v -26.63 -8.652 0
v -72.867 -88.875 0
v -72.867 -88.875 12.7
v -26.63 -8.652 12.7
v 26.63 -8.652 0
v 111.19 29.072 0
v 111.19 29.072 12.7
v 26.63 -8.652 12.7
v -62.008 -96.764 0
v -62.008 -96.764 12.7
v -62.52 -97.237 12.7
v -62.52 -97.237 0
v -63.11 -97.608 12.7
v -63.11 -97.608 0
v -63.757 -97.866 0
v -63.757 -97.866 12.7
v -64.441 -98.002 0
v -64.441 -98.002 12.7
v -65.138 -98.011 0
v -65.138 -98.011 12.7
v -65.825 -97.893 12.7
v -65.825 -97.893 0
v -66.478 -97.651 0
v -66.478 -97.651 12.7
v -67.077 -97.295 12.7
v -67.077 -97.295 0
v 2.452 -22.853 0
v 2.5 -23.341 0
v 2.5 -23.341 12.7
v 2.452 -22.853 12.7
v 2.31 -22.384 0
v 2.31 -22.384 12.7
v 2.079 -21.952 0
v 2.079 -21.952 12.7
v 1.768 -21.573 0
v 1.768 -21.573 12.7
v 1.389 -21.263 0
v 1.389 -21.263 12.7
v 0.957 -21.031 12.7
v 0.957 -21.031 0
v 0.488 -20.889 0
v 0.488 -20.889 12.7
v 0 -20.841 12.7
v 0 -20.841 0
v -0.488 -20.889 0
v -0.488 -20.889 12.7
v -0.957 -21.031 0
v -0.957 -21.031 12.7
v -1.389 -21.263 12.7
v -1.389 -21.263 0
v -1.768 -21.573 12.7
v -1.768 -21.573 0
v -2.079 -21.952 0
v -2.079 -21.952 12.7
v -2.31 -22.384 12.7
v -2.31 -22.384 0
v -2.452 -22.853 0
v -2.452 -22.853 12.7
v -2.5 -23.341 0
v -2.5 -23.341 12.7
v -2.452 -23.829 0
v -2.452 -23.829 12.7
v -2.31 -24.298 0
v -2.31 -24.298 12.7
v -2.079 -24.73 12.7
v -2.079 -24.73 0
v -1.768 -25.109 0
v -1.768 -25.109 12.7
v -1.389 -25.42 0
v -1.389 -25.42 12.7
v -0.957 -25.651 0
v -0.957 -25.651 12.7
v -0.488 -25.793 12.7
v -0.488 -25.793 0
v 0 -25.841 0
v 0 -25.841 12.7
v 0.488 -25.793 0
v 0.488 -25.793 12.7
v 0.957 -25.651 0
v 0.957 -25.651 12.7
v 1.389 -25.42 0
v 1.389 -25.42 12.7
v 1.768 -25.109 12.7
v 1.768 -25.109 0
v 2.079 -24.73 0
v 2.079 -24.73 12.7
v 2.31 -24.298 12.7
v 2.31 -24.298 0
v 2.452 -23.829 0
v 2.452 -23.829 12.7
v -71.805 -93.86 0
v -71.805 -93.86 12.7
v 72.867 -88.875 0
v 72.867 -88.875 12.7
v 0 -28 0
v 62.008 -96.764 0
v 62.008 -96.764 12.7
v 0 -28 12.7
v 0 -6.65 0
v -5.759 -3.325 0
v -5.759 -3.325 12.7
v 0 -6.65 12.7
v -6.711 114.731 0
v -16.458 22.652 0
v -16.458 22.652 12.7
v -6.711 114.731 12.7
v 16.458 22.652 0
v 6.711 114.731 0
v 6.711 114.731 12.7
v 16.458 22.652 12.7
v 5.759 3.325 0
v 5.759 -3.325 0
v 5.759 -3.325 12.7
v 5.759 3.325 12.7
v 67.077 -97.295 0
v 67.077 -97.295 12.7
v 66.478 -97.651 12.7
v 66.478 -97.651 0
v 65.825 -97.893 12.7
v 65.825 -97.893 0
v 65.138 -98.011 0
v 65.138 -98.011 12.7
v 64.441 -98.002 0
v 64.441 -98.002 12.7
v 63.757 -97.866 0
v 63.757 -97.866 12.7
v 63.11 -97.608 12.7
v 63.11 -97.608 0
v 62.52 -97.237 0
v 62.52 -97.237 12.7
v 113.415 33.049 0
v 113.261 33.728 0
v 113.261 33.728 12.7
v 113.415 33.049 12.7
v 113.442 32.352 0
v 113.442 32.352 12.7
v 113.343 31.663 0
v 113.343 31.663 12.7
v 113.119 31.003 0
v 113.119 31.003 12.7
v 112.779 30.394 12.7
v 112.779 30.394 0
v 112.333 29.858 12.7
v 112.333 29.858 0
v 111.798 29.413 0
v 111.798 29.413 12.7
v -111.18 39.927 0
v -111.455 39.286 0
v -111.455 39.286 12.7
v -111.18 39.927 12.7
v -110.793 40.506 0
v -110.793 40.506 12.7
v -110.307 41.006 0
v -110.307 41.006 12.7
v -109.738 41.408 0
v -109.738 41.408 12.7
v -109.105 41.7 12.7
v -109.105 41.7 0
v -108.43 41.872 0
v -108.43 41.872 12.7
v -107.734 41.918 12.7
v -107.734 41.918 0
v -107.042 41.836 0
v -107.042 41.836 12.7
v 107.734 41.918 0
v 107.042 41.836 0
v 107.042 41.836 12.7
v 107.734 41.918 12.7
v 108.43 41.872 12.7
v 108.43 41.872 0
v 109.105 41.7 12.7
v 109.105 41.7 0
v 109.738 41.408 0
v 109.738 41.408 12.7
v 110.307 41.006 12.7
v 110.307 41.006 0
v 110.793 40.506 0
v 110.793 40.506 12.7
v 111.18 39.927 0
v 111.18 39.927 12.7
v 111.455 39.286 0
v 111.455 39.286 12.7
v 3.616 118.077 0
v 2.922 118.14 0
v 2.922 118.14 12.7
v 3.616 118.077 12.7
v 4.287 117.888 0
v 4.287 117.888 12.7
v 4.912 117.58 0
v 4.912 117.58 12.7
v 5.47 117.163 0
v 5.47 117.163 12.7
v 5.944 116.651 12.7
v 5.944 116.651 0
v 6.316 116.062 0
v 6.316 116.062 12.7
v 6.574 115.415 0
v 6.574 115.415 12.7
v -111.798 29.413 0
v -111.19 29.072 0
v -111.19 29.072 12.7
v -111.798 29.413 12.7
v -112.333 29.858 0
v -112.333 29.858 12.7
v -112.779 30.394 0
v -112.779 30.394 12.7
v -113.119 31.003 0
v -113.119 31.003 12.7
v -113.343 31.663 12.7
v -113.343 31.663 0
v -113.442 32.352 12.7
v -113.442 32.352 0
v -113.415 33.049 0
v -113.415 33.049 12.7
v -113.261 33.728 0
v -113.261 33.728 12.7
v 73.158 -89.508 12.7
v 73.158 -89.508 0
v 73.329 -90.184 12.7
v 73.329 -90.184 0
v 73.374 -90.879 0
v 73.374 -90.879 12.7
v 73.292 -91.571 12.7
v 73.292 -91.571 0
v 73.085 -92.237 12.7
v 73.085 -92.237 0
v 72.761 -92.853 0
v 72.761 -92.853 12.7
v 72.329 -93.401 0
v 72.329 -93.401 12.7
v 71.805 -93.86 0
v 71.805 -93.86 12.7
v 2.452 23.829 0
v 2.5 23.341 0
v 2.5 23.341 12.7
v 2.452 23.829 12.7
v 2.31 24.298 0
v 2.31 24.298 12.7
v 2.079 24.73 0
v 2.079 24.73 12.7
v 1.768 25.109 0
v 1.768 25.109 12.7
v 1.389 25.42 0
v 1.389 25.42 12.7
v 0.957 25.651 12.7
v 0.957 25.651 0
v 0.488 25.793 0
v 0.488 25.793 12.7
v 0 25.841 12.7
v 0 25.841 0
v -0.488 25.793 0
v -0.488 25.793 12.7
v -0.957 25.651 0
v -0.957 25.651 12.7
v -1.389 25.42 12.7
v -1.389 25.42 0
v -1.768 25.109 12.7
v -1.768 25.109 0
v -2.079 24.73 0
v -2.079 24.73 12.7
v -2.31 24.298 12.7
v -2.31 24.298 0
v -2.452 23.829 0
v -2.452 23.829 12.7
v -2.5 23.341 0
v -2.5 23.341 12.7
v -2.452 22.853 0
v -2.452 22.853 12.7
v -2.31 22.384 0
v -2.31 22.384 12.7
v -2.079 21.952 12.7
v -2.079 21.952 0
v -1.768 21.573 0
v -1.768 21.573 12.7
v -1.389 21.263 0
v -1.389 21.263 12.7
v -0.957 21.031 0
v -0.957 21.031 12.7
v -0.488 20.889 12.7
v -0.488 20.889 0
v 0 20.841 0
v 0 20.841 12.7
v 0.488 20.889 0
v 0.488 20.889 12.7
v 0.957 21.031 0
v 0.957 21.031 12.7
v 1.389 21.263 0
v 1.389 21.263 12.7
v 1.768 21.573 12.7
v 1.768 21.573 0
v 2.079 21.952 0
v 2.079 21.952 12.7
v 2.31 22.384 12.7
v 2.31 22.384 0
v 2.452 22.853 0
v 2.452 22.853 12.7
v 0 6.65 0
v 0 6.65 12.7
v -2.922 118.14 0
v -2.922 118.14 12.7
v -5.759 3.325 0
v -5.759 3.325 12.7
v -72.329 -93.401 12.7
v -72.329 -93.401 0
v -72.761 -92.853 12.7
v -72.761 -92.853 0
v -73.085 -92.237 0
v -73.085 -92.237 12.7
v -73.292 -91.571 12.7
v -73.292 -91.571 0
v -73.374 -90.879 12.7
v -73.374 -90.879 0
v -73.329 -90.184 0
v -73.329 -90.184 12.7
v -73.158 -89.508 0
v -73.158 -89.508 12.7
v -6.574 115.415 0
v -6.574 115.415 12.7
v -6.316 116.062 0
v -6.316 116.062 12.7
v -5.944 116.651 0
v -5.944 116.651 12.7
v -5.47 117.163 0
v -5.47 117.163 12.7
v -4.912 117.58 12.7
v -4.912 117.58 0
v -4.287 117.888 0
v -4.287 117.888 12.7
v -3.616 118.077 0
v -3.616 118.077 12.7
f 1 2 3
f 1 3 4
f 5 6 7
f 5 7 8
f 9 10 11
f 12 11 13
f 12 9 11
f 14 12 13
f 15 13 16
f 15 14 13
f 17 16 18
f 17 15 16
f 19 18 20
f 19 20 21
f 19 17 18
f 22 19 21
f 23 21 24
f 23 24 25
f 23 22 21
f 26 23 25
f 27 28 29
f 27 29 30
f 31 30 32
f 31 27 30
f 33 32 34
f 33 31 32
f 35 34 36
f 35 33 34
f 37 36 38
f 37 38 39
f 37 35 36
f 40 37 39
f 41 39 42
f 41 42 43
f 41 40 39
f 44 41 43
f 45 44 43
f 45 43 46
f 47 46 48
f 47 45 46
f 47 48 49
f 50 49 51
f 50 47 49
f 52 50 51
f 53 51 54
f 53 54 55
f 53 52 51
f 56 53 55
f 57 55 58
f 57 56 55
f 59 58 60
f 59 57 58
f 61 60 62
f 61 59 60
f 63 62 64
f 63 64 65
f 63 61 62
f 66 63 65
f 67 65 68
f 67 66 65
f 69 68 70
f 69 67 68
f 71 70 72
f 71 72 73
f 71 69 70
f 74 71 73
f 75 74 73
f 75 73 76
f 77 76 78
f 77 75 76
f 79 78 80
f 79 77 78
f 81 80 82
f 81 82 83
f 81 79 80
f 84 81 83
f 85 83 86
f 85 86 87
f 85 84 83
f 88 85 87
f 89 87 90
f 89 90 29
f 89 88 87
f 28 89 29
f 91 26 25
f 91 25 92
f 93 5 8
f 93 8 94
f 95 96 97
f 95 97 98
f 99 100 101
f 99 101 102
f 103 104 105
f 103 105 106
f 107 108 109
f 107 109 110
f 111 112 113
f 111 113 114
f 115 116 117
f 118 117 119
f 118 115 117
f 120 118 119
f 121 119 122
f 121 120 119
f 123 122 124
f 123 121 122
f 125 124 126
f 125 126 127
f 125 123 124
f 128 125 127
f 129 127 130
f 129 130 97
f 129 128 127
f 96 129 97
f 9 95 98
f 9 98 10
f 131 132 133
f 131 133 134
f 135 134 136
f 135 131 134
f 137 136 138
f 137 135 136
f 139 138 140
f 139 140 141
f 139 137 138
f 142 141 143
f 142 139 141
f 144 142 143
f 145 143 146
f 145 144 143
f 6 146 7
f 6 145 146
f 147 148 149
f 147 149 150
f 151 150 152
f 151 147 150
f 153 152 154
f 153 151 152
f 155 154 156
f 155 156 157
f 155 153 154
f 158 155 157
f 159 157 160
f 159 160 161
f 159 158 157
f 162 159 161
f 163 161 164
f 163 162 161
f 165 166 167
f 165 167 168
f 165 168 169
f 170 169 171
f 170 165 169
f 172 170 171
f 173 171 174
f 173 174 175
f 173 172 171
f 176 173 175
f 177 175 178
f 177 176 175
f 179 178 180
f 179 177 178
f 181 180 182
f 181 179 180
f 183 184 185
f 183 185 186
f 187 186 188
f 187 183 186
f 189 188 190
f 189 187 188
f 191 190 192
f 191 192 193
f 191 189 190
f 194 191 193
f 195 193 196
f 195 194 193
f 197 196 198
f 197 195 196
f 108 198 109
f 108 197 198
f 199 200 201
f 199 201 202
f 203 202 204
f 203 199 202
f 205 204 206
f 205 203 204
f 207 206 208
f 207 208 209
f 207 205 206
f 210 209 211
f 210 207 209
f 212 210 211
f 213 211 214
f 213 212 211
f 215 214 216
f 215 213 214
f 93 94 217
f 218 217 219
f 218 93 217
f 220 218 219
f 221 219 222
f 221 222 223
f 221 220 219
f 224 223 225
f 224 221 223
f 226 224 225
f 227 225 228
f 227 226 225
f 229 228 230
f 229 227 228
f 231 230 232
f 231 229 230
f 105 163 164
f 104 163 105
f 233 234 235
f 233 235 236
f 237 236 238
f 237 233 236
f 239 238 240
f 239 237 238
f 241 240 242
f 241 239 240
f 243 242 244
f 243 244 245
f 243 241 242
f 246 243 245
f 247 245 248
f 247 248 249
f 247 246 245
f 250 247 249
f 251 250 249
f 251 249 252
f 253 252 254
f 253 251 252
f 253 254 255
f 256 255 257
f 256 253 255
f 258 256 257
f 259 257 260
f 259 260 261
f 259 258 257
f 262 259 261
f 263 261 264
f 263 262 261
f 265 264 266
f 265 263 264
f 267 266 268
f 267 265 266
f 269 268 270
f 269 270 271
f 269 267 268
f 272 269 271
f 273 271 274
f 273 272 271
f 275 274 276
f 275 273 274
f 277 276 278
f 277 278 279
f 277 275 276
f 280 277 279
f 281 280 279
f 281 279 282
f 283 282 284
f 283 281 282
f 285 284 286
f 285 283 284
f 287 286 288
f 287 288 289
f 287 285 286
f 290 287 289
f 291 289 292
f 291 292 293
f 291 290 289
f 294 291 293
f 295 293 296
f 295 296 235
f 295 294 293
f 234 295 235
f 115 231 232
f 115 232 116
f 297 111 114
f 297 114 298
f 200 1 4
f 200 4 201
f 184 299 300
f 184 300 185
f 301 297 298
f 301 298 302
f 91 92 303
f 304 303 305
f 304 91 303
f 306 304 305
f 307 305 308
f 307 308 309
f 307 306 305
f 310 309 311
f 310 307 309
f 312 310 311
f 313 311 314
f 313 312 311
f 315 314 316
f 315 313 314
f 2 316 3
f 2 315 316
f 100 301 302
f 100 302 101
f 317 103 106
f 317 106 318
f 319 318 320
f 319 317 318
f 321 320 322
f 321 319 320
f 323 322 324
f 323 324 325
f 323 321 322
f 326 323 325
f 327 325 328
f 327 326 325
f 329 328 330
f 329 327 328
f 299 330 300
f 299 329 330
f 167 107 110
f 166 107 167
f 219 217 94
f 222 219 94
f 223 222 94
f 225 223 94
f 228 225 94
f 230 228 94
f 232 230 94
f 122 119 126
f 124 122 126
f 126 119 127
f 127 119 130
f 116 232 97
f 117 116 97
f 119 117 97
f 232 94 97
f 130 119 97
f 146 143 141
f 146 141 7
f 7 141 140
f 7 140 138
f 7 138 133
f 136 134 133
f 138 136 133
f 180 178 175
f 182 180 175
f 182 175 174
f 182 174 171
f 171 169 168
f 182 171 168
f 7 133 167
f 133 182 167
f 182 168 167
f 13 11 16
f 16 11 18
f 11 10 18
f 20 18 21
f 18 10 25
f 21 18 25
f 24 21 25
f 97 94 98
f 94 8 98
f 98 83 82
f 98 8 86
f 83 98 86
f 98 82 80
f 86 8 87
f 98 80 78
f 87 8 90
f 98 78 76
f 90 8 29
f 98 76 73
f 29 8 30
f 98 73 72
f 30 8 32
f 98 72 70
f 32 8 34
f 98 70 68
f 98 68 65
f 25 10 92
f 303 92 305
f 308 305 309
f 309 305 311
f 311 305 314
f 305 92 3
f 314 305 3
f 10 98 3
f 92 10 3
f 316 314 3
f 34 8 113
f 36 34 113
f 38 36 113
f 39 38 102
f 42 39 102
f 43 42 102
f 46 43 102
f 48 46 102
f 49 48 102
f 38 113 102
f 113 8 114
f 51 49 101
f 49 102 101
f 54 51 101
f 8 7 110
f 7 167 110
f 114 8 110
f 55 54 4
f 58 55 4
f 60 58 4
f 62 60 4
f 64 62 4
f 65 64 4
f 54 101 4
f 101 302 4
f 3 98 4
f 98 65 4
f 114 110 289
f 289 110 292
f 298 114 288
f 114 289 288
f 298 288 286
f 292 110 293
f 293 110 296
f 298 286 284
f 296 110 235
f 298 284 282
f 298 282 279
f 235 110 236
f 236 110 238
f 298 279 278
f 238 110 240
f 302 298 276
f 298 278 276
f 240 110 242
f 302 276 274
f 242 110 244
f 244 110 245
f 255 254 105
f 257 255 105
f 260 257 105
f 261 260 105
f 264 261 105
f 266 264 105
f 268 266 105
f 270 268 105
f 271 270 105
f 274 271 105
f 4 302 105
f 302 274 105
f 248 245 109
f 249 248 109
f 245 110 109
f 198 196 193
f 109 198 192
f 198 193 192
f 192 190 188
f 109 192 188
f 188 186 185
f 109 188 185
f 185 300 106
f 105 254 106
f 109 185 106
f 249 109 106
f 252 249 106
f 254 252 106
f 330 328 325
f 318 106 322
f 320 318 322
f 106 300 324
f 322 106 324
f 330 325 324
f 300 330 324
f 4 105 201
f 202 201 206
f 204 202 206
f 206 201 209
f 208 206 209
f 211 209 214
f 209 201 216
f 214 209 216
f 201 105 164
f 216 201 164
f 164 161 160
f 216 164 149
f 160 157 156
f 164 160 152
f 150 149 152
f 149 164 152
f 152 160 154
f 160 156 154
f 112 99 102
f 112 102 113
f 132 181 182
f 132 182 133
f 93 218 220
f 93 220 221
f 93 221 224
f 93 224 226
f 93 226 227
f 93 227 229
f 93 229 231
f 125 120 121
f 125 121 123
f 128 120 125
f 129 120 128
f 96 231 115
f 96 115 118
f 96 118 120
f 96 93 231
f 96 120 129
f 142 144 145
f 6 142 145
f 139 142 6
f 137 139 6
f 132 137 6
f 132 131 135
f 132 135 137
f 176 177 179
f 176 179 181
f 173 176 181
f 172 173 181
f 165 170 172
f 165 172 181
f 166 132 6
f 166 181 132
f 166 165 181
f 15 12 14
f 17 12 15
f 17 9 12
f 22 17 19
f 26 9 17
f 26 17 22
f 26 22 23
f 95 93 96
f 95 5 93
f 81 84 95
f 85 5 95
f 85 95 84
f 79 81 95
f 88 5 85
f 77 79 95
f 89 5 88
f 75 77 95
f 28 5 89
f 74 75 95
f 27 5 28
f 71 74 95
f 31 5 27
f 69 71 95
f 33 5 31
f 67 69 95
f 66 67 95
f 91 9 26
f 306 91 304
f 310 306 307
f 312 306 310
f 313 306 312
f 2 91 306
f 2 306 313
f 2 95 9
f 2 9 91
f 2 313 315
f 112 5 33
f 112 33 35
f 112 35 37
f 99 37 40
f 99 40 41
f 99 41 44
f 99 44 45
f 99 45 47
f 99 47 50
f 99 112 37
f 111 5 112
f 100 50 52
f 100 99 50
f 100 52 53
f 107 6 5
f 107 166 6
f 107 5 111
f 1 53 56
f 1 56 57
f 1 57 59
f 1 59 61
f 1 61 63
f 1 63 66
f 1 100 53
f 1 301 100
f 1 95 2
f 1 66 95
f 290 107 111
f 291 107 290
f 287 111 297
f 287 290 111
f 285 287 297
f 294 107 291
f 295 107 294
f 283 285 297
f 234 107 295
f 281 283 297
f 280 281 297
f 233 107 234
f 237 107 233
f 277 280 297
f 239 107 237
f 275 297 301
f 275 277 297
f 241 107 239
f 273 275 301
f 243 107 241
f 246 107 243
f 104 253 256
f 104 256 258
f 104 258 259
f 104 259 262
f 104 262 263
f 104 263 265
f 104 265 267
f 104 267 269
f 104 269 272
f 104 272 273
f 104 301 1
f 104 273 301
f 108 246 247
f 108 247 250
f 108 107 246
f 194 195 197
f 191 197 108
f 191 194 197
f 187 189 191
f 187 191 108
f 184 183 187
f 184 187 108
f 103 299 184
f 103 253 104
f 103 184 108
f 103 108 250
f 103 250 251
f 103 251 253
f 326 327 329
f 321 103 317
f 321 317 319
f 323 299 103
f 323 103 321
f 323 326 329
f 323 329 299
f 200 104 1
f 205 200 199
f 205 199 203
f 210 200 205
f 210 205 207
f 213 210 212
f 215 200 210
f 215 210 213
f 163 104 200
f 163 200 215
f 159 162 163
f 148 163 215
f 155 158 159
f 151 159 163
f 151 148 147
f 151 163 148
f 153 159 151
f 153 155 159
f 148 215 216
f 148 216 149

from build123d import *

# Parameters (mm, degrees)
SKETCH1_R           = 2.5
BOSS_EXTRUDE1_DEPTH = 12.7


with BuildPart() as part:
    # Sketch1 → Boss-Extrude1 (new body)
    with BuildSketch(Plane.XY):
        with BuildLine():
            Line((-2.922024956, 118.140407077), (2.922024956, 118.140407077))
            ThreePointArc((2.922024956, 118.140407077), (5.470359591, 117.162736611), (6.710856163, 114.731478252))
            Line((6.710856163, 114.731478252), (16.457987064, 22.652475842))
            Line((16.457987064, 22.652475842), (107.042351415, 41.836380053))
            ThreePointArc((107.042351415, 41.836380053), (109.737950042, 41.407897856), (111.455248619, 39.286404385))
            Line((111.455248619, 39.286404385), (113.261159358, 33.728382634))
            ThreePointArc((113.261159358, 33.728382634), (113.1188182, 31.002655585), (111.189888617, 29.071573086))
            Line((111.189888617, 29.071573086), (26.629582456, -8.652475842))
            Line((26.629582456, -8.652475842), (72.866667573, -88.875173413))
            ThreePointArc((72.866667573, -88.875173413), (73.292142573, -91.571248333), (71.805156827, -93.860073872))
            Line((71.805156827, -93.860073872), (67.077221132, -97.295120224))
            ThreePointArc((67.077221132, -97.295120224), (64.440914824, -98.002041718), (62.008274208, -96.764257979))
            Line((62.008274208, -96.764257979), (0, -28))
            Line((0, -28), (-62.008274208, -96.764257979))
            ThreePointArc((-62.008274208, -96.764257979), (-64.440914824, -98.002041718), (-67.077221132, -97.295120224))
            Line((-67.077221132, -97.295120224), (-71.805156827, -93.860073872))
            ThreePointArc((-71.805156827, -93.860073872), (-73.292142573, -91.571248333), (-72.866667573, -88.875173413))
            Line((-72.866667573, -88.875173413), (-26.629582456, -8.652475842))
            Line((-26.629582456, -8.652475842), (-111.189888617, 29.071573086))
            ThreePointArc((-111.189888617, 29.071573086), (-113.1188182, 31.002655585), (-113.261159358, 33.728382634))
            Line((-113.261159358, 33.728382634), (-111.455248619, 39.286404385))
            ThreePointArc((-111.455248619, 39.286404385), (-109.737950042, 41.407897856), (-107.042351415, 41.836380053))
            Line((-107.042351415, 41.836380053), (-16.457987064, 22.652475842))
            Line((-16.457987064, 22.652475842), (-6.710856163, 114.731478252))
            ThreePointArc((-6.710856163, 114.731478252), (-5.470359591, 117.162736611), (-2.922024956, 118.140407077))
        make_face()
        with Locations((0, 23.341182104)):
            Circle(SKETCH1_R, mode=Mode.SUBTRACT)
        with Locations((0, -23.341182104)):
            Circle(SKETCH1_R, mode=Mode.SUBTRACT)
        Polygon((0, -6.65), (5.759068935, -3.325), (5.759068935, 3.325), (0, 6.65), (-5.759068935, 3.325), (-5.759068935, -3.325), align=None, mode=Mode.SUBTRACT)
    extrude(amount=BOSS_EXTRUDE1_DEPTH)


solid = part.part
